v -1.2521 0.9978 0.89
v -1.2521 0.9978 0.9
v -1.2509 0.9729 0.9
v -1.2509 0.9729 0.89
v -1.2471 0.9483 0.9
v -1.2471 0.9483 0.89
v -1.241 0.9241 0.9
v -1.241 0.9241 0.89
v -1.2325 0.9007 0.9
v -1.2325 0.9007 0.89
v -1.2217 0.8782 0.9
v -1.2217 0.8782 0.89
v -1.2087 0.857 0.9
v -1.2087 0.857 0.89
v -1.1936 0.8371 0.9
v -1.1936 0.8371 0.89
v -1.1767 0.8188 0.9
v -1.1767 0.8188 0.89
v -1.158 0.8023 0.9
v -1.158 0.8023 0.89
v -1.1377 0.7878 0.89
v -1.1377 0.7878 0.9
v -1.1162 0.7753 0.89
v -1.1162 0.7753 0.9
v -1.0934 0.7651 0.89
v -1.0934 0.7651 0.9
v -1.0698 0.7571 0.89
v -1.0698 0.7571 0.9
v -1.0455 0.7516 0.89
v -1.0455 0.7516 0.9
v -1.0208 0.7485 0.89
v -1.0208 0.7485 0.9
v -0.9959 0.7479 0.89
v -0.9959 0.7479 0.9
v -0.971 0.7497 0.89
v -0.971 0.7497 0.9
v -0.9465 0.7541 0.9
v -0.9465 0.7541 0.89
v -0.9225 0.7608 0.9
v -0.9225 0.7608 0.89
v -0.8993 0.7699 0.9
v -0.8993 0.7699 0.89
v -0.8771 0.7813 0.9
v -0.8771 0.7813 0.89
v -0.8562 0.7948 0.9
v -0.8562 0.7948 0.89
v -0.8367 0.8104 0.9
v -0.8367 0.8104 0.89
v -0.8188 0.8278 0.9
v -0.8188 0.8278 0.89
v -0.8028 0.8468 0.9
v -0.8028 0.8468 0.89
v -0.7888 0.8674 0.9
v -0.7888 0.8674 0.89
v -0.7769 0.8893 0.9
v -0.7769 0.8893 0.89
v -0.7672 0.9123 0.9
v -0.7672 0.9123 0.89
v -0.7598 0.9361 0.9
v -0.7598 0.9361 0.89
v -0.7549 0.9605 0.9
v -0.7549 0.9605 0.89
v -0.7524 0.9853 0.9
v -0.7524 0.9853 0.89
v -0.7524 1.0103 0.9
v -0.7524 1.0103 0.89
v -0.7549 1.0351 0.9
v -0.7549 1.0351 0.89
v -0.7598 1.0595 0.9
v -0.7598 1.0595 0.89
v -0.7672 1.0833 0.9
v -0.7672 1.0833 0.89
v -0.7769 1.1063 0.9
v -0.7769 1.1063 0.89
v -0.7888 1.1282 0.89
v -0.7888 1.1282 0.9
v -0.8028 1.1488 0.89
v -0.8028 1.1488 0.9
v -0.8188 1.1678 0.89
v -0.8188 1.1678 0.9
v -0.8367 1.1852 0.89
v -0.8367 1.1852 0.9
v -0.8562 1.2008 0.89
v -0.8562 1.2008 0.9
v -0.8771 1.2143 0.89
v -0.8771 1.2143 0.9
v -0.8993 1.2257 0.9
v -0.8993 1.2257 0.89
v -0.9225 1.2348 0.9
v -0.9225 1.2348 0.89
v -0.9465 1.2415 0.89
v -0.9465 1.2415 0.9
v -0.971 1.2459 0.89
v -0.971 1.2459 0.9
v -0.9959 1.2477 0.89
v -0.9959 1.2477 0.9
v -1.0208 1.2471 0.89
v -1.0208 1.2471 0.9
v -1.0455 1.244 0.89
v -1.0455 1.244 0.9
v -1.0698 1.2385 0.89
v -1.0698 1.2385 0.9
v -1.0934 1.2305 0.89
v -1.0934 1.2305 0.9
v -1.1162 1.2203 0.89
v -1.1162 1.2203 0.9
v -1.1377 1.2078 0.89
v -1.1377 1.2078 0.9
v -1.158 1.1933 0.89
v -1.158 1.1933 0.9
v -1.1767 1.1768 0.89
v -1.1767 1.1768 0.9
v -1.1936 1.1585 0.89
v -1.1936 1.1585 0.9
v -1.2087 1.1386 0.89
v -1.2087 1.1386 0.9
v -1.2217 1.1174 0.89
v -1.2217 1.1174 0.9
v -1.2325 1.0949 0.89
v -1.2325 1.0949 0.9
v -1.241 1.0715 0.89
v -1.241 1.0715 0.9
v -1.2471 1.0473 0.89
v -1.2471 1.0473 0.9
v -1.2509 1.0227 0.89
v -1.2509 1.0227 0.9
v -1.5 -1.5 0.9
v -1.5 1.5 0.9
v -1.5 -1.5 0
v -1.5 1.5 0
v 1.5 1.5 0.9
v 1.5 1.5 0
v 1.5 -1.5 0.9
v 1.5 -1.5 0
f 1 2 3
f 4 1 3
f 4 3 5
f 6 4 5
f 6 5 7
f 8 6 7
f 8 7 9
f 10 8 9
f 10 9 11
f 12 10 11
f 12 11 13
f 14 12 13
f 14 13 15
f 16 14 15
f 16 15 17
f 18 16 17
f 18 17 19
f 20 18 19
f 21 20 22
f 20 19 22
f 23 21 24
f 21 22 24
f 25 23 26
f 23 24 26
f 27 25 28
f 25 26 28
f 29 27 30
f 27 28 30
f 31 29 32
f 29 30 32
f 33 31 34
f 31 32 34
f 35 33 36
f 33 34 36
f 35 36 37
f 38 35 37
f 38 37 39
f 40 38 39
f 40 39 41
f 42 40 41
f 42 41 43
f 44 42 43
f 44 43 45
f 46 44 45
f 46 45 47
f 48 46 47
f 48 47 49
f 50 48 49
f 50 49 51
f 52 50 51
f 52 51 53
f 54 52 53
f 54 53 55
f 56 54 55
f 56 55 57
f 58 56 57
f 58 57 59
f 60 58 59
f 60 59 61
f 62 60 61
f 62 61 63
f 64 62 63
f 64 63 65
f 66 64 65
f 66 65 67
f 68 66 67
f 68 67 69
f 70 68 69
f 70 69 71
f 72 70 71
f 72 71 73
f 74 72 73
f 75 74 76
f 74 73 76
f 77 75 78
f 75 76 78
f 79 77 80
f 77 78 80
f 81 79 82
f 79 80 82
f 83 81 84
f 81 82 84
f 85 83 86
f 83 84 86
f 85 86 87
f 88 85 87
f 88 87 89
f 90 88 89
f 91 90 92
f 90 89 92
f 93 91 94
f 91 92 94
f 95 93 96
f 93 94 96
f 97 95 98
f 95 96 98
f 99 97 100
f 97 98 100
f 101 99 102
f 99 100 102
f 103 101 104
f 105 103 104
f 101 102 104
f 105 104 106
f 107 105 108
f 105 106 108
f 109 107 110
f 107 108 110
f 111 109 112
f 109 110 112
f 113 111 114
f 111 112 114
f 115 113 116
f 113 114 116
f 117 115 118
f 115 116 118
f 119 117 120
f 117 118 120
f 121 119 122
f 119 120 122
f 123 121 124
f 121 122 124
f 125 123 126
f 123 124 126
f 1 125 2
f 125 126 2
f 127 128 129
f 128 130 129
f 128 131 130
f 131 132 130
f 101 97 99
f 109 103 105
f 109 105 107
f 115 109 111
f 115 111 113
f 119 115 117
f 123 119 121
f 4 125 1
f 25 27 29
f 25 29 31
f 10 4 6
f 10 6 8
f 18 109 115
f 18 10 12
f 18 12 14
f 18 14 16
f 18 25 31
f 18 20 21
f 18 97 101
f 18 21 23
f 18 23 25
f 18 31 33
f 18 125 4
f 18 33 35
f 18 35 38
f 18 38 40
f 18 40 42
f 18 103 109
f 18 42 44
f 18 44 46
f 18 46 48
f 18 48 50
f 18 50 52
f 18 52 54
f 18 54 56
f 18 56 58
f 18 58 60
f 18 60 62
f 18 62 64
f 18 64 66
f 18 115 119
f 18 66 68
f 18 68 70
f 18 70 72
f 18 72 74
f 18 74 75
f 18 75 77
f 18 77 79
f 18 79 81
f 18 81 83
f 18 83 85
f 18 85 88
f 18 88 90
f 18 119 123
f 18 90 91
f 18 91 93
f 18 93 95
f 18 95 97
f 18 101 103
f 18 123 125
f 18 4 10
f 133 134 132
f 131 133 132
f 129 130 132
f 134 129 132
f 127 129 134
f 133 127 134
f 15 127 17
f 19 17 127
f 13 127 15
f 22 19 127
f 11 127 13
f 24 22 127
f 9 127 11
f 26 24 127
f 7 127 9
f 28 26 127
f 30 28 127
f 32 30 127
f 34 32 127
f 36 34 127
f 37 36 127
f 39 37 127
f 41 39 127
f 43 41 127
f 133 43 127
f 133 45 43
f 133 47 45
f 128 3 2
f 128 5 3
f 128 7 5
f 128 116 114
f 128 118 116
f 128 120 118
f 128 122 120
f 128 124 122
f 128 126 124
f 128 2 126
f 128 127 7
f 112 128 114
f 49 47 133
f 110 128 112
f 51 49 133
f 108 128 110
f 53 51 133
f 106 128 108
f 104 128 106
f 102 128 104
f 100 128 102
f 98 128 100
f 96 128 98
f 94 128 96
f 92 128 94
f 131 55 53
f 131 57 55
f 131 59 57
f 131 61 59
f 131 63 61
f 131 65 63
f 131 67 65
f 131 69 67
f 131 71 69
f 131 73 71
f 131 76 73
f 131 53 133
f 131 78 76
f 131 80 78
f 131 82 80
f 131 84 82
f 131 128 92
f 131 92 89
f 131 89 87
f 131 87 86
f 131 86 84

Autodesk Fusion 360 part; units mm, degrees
sketch "スケッチ1" plane through (0, 0, 0) normal (0, 0, 1) x (1, 0, 0)
  line L0 (1.5, 1.5) -> (-1.5, 1.5)
  line L1 (-1.5, 1.5) -> (-1.5, -1.5)
  line L2 (-1.5, -1.5) -> (1.5, -1.5)
  line L3 (1.5, -1.5) -> (1.5, 1.5)
  line L4 (1.5, 1.5) -> (-1.5, -1.5) construction
  line L5 (-1.5, 1.5) -> (1.5, -1.5) construction
  dimension "d1" = 3
  dimension "d2" = 3
extrude "押し出し1" add sketch "スケッチ1" along normal blind 0.9
sketch "スケッチ2" plane through (0, 0, 0.9) normal (0, 0, 1) x (-1, 0, 0)
  line L0 (-1.5, 1.5) -> (-1.5, -1.5)
  line L1 (-1.5, -1.5) -> (1.5, -1.5)
  line L2 (1.5, -1.5) -> (1.5, 1.5)
  line L3 (1.5, 1.5) -> (-1.5, 1.5)
  circle A0 centre (1.0021, -0.9978) radius 0.25
  dimension "d5" = 0.5
extrude "押し出し2" cut sketch "スケッチ2" against normal blind 0.01 contours A0
